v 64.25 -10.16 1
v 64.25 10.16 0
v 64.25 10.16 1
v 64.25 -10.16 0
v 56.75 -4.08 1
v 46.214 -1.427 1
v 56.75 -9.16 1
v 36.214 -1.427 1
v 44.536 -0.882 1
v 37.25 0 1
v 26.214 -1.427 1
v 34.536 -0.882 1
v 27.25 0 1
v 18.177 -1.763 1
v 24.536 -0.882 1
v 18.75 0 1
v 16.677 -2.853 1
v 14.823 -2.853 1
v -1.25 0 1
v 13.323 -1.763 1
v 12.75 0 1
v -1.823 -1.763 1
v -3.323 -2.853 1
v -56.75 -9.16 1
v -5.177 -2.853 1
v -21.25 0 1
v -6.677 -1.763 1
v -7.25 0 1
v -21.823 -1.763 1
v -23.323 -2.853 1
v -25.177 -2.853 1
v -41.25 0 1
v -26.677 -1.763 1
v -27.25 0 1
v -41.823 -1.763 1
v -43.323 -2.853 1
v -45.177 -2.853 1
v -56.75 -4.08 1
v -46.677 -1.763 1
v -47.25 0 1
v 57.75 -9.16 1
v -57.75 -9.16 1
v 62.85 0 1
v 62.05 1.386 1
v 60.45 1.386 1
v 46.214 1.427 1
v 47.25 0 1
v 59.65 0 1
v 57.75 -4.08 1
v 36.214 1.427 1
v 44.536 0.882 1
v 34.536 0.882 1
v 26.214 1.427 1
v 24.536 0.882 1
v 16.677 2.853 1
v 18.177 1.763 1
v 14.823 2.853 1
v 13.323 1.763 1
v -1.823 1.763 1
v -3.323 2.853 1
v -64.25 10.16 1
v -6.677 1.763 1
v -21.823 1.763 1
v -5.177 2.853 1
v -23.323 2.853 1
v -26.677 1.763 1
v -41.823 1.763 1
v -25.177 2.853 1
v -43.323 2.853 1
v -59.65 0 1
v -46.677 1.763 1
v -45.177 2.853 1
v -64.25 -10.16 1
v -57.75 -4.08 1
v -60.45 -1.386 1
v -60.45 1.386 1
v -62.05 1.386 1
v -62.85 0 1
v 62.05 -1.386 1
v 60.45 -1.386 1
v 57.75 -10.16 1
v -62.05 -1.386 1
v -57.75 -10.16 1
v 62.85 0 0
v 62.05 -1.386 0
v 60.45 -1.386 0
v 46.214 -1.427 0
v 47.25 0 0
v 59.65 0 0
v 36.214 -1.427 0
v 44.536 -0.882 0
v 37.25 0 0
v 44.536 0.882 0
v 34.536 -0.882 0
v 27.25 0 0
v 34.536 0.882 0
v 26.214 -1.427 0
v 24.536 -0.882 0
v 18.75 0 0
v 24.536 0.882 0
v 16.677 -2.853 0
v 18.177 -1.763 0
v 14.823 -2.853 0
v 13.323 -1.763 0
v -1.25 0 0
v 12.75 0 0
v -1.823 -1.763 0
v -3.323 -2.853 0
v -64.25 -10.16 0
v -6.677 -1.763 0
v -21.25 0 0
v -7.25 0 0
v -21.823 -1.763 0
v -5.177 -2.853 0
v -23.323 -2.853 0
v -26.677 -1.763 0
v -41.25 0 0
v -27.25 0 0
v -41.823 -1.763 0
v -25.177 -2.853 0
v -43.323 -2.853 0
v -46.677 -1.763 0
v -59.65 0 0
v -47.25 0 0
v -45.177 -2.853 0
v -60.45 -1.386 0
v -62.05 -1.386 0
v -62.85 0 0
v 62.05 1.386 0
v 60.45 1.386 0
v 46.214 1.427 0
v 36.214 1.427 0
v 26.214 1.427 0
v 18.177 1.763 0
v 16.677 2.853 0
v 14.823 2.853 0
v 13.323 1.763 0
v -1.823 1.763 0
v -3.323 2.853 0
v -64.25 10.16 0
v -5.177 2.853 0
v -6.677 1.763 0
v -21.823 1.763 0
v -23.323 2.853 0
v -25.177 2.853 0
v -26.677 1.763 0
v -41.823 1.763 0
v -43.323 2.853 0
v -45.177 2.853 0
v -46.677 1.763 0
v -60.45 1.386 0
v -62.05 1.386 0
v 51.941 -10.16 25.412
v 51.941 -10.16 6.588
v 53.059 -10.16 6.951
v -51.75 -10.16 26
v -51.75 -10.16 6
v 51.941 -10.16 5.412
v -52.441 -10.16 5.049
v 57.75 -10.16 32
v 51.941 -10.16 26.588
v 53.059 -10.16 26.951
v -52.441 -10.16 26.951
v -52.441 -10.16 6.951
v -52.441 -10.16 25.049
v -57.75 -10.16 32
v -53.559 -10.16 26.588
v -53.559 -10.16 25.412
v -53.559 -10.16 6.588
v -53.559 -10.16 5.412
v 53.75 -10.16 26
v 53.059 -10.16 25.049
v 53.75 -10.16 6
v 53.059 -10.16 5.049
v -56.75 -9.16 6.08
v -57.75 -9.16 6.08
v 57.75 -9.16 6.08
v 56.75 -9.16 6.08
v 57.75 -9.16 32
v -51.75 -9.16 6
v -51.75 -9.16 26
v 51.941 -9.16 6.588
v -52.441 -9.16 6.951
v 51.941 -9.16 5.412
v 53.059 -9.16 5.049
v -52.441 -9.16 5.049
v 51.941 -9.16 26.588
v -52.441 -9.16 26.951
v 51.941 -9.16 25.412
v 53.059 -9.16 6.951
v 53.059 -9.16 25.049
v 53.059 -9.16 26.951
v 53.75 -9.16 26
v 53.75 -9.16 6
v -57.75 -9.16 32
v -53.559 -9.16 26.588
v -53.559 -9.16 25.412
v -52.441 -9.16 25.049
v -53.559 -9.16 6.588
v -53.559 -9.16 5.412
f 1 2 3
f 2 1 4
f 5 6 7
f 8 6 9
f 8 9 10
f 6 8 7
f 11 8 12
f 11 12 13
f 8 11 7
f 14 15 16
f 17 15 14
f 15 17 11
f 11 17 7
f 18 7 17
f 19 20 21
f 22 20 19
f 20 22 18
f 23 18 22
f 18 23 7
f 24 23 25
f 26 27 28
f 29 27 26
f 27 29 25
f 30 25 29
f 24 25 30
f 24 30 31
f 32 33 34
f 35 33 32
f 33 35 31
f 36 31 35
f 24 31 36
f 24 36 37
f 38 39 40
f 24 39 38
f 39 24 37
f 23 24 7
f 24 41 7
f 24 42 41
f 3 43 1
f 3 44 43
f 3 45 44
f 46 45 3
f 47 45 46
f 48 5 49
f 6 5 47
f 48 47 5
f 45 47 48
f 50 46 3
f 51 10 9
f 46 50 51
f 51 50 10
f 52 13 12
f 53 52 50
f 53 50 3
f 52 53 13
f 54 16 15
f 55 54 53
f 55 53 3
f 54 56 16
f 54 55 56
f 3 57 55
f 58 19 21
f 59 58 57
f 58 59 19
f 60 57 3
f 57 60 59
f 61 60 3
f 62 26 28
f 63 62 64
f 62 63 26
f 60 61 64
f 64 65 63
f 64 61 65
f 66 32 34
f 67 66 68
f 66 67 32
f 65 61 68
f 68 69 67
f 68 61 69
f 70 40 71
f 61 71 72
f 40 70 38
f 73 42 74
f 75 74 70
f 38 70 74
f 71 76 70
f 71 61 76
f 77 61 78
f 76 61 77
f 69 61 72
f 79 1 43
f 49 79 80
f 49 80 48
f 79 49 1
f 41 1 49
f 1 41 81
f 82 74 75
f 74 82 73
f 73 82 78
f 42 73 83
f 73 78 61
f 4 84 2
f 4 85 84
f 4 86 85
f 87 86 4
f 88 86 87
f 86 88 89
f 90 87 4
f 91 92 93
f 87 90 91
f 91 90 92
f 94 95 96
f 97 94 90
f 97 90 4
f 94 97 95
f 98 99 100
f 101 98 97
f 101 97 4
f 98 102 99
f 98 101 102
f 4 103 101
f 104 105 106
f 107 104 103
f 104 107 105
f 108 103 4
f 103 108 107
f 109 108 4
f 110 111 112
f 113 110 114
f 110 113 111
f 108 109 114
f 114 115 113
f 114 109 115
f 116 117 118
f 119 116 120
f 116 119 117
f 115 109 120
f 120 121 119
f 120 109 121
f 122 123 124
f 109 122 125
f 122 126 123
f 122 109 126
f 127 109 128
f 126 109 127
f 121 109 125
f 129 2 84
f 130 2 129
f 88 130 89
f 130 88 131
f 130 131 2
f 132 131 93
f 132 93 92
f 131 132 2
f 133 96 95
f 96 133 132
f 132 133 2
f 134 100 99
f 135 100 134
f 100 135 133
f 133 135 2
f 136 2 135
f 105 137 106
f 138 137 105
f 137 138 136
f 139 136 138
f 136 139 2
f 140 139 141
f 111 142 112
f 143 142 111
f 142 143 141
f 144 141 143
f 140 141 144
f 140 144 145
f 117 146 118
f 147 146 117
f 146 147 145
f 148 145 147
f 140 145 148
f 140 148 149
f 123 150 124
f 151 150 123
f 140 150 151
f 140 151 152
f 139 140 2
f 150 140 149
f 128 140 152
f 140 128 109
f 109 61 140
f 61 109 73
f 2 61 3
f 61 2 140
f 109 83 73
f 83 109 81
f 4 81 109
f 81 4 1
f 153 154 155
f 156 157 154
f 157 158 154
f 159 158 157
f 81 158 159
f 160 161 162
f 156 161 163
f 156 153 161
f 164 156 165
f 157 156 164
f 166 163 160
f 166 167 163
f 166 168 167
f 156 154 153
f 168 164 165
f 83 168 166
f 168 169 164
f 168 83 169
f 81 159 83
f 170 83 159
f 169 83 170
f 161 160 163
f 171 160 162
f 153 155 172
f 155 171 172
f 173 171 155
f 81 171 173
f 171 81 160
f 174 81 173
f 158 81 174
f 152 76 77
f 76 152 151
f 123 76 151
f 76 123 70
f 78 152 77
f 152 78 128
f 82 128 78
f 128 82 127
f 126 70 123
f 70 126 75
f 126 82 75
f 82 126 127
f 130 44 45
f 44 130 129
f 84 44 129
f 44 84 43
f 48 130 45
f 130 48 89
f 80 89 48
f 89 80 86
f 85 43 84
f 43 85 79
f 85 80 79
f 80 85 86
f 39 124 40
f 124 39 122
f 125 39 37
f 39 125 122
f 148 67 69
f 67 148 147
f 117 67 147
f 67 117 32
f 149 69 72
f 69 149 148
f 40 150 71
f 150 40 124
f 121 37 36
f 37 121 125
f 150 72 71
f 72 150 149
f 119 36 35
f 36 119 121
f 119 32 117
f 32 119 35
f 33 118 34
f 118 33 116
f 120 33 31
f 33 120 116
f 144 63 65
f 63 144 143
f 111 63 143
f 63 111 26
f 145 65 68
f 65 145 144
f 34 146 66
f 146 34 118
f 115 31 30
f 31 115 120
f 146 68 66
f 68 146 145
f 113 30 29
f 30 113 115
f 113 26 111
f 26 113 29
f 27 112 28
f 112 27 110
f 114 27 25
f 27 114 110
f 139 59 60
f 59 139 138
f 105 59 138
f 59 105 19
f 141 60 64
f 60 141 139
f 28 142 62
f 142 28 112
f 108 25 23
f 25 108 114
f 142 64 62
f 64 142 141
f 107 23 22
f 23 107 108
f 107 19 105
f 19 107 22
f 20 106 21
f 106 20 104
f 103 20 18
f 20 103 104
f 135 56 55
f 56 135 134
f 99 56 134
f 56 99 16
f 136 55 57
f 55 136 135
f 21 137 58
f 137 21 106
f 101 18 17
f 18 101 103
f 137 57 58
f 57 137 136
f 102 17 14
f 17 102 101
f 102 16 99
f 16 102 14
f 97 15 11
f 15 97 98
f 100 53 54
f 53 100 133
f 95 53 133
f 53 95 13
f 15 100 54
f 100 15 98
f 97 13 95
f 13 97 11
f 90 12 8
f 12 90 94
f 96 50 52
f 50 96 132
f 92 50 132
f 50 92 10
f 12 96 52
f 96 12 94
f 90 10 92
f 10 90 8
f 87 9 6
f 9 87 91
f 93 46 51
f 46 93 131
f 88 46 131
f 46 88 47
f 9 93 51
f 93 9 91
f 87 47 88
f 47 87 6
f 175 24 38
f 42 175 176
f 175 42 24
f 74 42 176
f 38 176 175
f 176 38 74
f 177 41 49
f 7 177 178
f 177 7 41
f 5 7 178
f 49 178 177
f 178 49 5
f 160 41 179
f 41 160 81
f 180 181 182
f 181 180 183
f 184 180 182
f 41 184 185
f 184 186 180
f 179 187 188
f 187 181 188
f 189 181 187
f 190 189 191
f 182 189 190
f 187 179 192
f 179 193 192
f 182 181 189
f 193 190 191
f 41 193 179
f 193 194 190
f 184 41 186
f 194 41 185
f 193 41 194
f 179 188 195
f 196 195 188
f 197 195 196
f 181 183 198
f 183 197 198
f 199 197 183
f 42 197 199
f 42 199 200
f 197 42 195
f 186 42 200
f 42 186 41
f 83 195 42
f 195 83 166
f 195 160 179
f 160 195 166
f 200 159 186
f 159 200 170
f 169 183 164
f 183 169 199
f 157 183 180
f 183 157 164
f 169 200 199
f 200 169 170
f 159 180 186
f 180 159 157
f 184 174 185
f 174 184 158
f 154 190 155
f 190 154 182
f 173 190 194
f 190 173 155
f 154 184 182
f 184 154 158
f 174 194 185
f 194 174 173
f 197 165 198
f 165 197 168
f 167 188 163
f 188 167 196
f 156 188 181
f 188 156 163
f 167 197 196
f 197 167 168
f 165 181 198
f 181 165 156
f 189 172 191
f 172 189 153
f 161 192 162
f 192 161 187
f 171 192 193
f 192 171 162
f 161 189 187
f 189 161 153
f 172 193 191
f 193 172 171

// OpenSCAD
// Parameterised Eurorack module blank
// (C) 2023 Rebecca Scott (me@becdetat.com) / Tanby Dynamics (tanbydynamics.co)
// MIT license

// Globals
wallThickness = 1;
erHeight = 128.5;   // 3U
erHorizontalPitch = 5.08;   //1/2"
erPanelClearance = 6;
erPanelScrewDiam = 3.2;   // 1/16"
pcbPlateScrewDiam = 2;   // 2 = M2
enablePCBPlateSupports = true;  // Small supports on the PCB plate
enablePCBPlateScrewHoles = true;

eurorack_module_blank(units = 4) {
    // Add custom holes here. Remember that the
    // rail will cover `erPanelClearance` on the
    // top and bottom.
    
    // make some example 6mm and 3mm holes
    centerX = 20;
    centerY = erHorizontalPitch*4/2;
    translate([centerX,centerY,-0.5])
    makeHole(6);
    translate([centerX*2,centerY,-0.5])
    makeHole(6);
    translate([centerX*3,centerY,-0.5])
    makeHole(6);
    translate([centerX*4,centerY,-0.5])
    makeHole(6);
    translate([centerX*4.5,centerY,-0.5])
    makeHole(3);
    translate([centerX*5,centerY,-0.5])
    makeHole(3);
    translate([centerX*5.5,centerY,-0.5])
    makeHole(3);
};

module makeHole(d) {
    cylinder(h=wallThickness+1, d=d);
}


module eurorack_module_blank(units) {
    translate([-erHeight/2,-erHorizontalPitch*units/2,0]) {
        difference() {
            front_panel(units);
            children(); // children should be cylinders that cut through the front panel
        }
        pcb_plate(width = 30, units = units);
    }
}

module front_panel(units) {
    width = erHorizontalPitch*units;
    
    difference() {
        cube([erHeight, width, wallThickness]);
        // top screw hole
        translate([erPanelClearance/2,width/2,-0.5])
        cylinder(h=wallThickness+1, d=erPanelScrewDiam);
        // bottom screw hole
        translate([
            erHeight - erPanelClearance/2,
            width/2,
            -0.5
        ])
        cylinder(h=wallThickness+1, d=erPanelScrewDiam);
    }
}

module pcb_plate(width, units) {
    lengthTolerance = 1;    // trim a millimetre to clear the rails
    length = erHeight-erPanelClearance*2 - lengthTolerance;
    
    rotate([90, 0, 0])
    translate([erPanelClearance + lengthTolerance/2, wallThickness, -wallThickness])
    difference() {
         {
             union() {
                // The plate
                cube([length, width+wallThickness, wallThickness]);
                
                if (enablePCBPlateSupports) {
                    pcb_plate_support(units);
                    translate([length-wallThickness, 0, 0])
                    pcb_plate_support(units);
                }
            }
        }
        
        if (enablePCBPlateScrewHoles) {
            pcb_plate_screw_holes(width, length);
        }
    }

}

// Increase widthRatio for larger supports
module pcb_plate_support(units, widthRatio = 0.25) {
    width = erHorizontalPitch*units*widthRatio;
    
    translate([wallThickness,0,-width])
    rotate([0,270,0])
    linear_extrude(height=wallThickness)
    polygon([
        [0,0],
        [width,0],
        [width,width]
    ]);
}

// offset is the distance in from the corner
module pcb_plate_screw_holes(pcbWidth, pcbLength, offset = 5) {
    module hole() {
        cylinder(h = wallThickness + 1, d = pcbPlateScrewDiam);
    }
    zOffset = -wallThickness+0.5;
    
    translate([offset, offset, zOffset])
    hole();
    translate([pcbLength-offset, offset, zOffset])
    hole();
    translate([offset, pcbWidth-offset, zOffset])
    hole();
    translate([pcbLength-offset, pcbWidth-offset, zOffset])
    hole();
    
}
